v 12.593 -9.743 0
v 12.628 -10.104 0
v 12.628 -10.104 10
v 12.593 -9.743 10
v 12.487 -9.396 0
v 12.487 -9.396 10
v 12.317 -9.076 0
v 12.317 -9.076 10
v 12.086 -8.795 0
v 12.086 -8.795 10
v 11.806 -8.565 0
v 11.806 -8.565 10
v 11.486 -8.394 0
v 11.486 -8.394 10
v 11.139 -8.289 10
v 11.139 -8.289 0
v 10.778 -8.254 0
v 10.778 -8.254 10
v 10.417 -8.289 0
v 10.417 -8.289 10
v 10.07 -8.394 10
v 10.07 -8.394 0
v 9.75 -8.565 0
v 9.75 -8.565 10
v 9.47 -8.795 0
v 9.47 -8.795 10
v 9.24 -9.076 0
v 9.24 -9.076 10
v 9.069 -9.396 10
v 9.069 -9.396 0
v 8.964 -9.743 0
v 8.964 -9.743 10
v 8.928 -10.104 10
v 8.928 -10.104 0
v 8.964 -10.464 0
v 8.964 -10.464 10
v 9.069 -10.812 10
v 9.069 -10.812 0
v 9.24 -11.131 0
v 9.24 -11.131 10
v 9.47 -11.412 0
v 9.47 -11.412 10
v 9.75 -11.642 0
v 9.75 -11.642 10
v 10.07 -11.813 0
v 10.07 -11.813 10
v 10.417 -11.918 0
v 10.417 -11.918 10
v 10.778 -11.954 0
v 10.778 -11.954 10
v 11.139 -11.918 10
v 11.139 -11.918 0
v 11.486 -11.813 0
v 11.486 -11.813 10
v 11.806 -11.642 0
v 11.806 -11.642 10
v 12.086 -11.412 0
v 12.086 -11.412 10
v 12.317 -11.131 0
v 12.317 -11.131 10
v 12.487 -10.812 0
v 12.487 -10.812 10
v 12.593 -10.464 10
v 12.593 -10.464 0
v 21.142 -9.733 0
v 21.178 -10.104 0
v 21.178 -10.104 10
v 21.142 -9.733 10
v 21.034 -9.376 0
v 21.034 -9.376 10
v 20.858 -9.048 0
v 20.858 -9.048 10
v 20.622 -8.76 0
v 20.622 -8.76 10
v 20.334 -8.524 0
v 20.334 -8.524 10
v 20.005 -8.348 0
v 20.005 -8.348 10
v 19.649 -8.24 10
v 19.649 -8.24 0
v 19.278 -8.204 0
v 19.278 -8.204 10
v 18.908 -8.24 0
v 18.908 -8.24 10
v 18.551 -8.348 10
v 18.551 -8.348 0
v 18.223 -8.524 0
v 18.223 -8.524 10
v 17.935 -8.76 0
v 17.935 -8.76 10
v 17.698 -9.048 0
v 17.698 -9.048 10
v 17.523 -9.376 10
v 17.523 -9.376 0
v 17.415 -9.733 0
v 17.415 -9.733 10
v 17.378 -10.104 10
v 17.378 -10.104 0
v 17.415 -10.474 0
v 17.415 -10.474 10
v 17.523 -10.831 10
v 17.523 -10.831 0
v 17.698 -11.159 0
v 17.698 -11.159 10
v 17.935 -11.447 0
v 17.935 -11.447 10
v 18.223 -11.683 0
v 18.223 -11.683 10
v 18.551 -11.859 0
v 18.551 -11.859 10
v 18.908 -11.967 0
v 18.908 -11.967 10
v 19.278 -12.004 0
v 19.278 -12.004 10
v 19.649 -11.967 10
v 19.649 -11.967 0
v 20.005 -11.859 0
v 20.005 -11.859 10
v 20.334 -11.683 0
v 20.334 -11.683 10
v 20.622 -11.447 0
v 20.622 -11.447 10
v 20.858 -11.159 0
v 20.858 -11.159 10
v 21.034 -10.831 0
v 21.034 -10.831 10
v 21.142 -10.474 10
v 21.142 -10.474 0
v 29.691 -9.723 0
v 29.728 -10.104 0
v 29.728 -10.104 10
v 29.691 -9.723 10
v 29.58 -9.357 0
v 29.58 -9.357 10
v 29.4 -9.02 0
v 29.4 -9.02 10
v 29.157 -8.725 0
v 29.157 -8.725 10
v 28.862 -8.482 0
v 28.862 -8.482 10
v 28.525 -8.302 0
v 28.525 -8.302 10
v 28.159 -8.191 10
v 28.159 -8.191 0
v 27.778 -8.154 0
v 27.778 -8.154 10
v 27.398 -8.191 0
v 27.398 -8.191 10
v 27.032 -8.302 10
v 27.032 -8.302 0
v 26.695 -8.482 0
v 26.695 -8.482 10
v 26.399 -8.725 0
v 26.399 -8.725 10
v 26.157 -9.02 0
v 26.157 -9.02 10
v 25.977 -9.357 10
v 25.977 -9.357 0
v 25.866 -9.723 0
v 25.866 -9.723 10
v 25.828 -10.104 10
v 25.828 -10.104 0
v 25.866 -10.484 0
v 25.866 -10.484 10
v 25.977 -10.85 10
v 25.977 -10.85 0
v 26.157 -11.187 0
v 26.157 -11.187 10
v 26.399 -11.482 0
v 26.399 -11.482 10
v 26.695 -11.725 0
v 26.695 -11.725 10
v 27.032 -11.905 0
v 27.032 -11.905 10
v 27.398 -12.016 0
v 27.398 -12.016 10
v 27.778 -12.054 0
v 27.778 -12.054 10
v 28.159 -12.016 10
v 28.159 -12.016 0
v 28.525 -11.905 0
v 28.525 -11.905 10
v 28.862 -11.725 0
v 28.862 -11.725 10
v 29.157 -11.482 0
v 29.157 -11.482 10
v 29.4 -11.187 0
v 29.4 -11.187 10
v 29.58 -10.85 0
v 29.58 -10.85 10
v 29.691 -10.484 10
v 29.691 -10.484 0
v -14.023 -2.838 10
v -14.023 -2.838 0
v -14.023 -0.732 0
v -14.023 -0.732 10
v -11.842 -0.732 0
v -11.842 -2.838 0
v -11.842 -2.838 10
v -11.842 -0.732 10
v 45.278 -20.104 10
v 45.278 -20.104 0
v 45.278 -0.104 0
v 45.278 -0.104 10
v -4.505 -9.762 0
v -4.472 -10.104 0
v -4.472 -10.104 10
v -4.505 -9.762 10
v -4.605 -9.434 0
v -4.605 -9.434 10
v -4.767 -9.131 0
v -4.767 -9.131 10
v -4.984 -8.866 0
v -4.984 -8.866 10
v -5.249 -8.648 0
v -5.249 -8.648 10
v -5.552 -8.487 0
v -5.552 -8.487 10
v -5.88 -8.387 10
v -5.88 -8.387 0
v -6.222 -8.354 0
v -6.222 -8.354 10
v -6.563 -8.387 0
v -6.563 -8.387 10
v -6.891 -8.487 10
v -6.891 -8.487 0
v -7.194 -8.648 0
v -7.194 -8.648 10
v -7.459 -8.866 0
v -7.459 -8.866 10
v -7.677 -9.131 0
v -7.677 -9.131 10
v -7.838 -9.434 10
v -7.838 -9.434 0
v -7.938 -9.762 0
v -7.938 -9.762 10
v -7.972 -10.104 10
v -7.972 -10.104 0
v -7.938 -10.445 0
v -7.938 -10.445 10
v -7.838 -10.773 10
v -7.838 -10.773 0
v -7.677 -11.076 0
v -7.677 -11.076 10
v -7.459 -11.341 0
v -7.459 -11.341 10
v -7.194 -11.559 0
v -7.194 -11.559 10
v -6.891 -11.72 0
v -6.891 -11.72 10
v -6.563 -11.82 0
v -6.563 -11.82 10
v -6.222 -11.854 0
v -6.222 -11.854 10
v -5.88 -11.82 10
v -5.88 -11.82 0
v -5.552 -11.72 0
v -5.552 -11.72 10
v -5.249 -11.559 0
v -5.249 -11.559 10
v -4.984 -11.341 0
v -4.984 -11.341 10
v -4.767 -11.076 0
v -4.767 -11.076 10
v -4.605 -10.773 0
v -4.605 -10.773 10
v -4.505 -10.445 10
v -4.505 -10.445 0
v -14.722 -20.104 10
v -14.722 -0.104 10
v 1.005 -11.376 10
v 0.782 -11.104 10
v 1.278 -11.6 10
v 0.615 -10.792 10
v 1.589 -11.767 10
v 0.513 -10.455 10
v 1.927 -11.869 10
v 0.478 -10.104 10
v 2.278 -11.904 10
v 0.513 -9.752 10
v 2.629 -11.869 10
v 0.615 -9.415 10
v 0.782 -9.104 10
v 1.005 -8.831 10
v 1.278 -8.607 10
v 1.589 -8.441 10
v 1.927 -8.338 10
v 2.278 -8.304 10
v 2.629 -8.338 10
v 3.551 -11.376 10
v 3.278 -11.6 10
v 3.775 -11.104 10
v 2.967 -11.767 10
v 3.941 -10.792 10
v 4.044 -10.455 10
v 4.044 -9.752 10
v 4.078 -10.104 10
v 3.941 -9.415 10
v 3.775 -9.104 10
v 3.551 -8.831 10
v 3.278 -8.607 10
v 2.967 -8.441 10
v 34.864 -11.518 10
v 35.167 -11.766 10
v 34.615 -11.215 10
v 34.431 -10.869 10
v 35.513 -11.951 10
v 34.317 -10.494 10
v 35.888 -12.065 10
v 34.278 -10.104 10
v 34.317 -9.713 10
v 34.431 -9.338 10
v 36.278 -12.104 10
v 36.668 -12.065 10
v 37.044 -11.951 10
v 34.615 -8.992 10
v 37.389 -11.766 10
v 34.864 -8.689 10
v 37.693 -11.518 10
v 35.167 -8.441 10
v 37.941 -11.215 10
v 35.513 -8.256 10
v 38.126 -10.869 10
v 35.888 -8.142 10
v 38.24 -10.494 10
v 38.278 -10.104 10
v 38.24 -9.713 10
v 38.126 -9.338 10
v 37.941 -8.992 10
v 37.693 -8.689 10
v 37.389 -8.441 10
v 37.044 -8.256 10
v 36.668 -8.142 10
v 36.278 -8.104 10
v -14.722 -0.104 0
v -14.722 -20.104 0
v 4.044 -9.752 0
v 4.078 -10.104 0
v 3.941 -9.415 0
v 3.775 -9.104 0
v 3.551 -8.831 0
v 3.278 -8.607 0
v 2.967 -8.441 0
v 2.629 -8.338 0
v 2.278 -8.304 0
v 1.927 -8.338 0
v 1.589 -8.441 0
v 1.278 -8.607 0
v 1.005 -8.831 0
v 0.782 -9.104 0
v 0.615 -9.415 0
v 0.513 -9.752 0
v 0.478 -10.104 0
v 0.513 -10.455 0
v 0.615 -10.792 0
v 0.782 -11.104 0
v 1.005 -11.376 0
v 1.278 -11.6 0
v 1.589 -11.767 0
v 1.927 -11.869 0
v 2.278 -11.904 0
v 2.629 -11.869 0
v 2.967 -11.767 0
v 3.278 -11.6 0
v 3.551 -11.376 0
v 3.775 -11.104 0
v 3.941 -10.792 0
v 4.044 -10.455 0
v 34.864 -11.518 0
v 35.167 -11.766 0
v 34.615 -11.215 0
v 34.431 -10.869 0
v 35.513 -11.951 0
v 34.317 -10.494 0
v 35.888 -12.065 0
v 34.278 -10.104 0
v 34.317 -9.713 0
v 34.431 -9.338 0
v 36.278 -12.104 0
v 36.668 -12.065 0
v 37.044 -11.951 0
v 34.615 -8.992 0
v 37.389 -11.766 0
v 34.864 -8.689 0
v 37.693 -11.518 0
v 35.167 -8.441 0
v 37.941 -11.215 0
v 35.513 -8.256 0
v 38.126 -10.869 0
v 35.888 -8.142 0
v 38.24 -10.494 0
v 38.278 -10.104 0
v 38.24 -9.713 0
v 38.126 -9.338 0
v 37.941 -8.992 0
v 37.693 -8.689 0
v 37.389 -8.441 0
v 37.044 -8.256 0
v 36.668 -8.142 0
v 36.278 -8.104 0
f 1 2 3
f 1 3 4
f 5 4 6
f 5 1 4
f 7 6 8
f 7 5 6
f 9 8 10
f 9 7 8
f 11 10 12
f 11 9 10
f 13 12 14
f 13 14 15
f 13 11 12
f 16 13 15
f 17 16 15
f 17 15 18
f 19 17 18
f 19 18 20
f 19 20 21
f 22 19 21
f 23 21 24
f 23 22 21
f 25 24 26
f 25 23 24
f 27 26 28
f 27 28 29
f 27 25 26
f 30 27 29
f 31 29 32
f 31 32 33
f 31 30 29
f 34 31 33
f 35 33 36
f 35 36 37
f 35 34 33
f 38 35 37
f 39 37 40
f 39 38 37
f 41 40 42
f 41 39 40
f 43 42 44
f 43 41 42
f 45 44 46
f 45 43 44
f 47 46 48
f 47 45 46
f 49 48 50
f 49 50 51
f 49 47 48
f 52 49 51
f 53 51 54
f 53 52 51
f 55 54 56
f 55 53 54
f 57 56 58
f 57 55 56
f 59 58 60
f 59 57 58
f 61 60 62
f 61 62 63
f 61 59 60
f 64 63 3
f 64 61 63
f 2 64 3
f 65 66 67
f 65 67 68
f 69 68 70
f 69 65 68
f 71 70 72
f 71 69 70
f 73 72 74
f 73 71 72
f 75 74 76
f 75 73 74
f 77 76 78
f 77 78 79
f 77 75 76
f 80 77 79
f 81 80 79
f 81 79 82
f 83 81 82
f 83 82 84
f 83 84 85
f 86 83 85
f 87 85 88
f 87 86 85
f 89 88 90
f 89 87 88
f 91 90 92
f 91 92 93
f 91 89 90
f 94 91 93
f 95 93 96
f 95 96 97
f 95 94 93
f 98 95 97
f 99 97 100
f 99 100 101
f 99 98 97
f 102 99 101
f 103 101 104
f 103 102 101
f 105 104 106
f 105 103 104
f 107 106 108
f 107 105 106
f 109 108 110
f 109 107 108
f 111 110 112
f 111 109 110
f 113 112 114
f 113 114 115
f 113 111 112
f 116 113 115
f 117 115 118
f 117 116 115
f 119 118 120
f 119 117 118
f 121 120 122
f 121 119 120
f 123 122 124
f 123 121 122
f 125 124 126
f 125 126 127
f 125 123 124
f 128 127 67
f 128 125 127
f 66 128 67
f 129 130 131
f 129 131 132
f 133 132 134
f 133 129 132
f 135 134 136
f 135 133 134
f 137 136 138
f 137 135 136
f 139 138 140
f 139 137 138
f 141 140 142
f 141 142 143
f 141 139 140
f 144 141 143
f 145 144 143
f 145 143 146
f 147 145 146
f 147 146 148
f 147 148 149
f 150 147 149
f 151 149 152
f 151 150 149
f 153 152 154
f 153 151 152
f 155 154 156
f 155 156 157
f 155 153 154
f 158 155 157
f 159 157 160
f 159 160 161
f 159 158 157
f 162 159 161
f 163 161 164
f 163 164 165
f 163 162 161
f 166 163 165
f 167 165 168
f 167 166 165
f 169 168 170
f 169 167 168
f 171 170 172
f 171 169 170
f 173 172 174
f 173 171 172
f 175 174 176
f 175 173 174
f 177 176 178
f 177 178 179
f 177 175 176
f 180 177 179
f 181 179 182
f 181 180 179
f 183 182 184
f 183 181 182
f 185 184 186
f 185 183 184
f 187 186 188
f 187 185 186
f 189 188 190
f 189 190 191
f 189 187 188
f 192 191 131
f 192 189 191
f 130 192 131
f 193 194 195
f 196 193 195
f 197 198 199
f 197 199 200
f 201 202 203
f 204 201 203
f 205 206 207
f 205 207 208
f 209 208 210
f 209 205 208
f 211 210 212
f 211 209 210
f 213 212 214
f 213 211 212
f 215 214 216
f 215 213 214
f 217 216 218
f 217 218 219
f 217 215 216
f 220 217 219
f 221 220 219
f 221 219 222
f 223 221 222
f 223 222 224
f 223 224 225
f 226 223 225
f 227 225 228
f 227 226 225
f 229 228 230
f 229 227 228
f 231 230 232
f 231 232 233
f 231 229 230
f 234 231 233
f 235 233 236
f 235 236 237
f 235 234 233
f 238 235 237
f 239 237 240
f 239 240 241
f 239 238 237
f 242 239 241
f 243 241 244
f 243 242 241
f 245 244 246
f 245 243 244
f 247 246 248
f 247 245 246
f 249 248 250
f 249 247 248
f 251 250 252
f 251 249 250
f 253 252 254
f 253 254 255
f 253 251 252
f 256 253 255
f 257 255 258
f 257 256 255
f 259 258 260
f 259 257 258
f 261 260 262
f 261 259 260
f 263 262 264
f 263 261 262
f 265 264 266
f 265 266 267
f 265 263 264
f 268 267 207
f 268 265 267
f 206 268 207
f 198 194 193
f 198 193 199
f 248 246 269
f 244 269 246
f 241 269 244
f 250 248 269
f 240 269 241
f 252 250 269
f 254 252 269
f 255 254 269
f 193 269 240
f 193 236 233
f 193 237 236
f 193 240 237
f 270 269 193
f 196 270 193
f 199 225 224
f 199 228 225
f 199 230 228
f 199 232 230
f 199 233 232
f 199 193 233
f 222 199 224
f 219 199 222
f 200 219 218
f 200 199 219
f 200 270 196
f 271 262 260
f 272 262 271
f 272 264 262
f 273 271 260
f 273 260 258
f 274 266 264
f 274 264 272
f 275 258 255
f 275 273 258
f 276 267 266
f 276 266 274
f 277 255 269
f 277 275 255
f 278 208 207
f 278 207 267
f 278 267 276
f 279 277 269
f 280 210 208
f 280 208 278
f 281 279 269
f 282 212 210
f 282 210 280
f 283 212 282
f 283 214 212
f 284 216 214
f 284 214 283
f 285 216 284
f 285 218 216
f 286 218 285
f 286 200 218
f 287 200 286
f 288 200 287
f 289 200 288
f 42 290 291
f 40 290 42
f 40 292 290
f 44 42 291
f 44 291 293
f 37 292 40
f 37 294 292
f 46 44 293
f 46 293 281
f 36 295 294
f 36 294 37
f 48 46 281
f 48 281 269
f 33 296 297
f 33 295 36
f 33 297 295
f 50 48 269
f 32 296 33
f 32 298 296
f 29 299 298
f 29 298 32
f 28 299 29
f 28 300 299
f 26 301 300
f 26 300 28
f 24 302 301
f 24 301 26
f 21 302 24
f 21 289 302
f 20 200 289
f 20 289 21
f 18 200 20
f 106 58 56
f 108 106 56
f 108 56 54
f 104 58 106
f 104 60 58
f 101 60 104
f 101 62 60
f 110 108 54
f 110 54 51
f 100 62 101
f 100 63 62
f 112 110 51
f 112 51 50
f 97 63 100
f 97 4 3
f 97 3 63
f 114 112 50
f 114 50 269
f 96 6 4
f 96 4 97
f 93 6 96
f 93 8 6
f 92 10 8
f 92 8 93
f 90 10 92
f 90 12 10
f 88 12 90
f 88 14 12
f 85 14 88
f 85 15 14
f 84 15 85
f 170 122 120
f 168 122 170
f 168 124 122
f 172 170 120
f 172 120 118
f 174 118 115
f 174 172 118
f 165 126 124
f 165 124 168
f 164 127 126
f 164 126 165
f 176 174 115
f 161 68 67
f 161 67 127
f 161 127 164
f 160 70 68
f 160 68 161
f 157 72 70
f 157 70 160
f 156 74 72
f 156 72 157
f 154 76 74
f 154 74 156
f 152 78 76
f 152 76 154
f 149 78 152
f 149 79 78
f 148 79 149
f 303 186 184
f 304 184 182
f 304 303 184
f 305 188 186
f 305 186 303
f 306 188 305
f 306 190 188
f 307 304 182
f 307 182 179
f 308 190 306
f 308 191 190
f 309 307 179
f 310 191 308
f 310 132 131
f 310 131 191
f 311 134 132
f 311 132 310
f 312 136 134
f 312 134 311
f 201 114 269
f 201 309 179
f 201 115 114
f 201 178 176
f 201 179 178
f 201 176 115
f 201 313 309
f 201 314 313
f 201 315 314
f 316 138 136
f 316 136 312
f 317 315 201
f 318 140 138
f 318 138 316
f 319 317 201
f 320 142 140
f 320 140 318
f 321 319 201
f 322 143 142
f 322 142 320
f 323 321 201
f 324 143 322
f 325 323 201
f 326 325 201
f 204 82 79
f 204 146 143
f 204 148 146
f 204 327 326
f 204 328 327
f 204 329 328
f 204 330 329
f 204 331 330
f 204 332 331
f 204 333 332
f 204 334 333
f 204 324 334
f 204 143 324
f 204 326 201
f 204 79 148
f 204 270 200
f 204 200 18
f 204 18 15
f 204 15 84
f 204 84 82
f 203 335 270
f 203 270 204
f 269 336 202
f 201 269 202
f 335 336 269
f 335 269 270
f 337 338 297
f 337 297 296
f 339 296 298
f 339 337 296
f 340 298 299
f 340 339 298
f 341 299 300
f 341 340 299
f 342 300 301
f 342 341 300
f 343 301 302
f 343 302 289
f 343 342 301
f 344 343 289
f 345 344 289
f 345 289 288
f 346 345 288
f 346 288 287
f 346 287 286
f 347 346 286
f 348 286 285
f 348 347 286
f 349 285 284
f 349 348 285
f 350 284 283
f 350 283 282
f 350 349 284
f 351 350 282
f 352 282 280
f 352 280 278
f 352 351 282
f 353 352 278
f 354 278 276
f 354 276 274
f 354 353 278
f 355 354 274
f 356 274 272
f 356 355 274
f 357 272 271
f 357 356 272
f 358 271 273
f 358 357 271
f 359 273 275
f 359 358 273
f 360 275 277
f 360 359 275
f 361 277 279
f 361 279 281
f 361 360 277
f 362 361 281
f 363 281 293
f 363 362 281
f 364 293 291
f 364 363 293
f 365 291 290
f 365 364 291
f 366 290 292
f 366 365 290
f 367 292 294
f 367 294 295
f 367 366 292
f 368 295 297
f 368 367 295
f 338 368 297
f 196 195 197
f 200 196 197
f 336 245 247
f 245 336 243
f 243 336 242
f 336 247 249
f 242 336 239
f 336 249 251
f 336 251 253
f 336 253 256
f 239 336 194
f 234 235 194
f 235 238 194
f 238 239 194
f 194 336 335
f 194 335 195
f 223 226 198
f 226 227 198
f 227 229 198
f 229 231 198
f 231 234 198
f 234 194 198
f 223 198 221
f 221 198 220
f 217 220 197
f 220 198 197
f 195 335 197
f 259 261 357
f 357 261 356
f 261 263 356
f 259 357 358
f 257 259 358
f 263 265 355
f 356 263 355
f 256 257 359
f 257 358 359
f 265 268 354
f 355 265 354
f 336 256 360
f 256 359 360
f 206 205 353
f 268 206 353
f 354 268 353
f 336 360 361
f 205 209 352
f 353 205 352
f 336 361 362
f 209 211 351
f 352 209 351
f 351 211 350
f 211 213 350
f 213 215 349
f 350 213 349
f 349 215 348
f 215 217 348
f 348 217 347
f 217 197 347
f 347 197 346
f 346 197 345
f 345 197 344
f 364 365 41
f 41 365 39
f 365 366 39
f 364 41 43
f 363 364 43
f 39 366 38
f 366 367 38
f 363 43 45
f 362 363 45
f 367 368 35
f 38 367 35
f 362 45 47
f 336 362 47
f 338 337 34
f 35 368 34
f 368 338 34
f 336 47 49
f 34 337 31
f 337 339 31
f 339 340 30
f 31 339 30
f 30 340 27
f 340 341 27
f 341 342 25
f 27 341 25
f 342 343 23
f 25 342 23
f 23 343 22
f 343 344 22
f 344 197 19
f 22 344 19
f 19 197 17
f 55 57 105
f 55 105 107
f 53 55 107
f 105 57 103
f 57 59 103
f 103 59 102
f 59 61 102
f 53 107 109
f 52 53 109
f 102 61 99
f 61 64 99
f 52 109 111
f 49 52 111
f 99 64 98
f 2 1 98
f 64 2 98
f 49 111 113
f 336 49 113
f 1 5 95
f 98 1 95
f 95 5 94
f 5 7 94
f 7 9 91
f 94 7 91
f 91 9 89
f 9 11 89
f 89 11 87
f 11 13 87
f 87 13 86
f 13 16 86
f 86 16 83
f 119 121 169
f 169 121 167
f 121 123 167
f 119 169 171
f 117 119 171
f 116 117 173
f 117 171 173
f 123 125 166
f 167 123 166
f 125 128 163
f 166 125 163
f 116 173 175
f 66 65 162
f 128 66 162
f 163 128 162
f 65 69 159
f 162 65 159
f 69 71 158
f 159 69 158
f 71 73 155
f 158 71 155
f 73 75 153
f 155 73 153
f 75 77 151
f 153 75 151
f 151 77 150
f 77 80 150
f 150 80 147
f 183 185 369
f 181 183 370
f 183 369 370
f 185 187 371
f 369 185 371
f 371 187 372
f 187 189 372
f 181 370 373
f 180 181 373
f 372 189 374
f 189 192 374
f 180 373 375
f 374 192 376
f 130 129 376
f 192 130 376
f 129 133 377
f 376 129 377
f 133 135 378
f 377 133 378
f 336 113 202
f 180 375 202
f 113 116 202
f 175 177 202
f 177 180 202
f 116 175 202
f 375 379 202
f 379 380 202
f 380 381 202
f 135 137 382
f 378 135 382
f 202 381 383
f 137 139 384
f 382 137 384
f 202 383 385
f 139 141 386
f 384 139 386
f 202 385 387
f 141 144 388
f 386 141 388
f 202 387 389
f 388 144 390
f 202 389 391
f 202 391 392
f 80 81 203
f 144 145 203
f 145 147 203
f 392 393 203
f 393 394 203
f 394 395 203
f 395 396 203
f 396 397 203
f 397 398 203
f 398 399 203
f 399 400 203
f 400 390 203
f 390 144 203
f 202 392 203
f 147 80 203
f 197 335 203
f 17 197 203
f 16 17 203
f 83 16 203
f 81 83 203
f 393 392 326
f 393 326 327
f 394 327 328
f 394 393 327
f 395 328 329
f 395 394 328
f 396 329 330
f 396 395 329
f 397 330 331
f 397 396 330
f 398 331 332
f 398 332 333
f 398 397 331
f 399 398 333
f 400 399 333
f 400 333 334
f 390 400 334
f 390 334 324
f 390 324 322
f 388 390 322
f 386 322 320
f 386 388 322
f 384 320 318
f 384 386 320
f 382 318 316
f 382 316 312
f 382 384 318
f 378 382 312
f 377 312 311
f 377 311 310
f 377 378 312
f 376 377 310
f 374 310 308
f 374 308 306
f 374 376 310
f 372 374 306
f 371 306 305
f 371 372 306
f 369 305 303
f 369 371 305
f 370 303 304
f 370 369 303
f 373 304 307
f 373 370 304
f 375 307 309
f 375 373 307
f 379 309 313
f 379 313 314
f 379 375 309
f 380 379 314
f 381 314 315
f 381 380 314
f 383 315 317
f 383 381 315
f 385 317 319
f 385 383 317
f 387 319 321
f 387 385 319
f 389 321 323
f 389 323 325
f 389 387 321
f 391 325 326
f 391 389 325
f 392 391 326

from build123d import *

# Parameters (mm, degrees)
F0_W     = 60
F0_H     = 20
F0_R     = 1.75
F0_R_2   = 1.8
F0_R_3   = 1.85
F0_R_4   = 1.9
F0_R_5   = 1.95
F0_R_6   = 2
F0_W_2   = 2.181272
F0_H_2   = 2.106054
F1_DEPTH = 10


with BuildPart() as f1:
    # F0 (on Top) → F1 (new body)
    with BuildSketch(Plane.XY):
        with Locations((15.278291, -10.103558)):
            Rectangle(F0_W, F0_H)
        with Locations((-6.221709, -10.103558)):
            Circle(F0_R, mode=Mode.SUBTRACT)
        with Locations((2.278291, -10.103558)):
            Circle(F0_R_2, mode=Mode.SUBTRACT)
        with Locations((10.778291, -10.103558)):
            Circle(F0_R_3, mode=Mode.SUBTRACT)
        with Locations((19.278291, -10.103558)):
            Circle(F0_R_4, mode=Mode.SUBTRACT)
        with Locations((27.778291, -10.103558)):
            Circle(F0_R_5, mode=Mode.SUBTRACT)
        with Locations((36.278291, -10.103558)):
            Circle(F0_R_6, mode=Mode.SUBTRACT)
        with Locations((-12.932548, -1.785417)):
            Rectangle(F0_W_2, F0_H_2, mode=Mode.SUBTRACT)
    extrude(amount=F1_DEPTH)


solid = f1.part
